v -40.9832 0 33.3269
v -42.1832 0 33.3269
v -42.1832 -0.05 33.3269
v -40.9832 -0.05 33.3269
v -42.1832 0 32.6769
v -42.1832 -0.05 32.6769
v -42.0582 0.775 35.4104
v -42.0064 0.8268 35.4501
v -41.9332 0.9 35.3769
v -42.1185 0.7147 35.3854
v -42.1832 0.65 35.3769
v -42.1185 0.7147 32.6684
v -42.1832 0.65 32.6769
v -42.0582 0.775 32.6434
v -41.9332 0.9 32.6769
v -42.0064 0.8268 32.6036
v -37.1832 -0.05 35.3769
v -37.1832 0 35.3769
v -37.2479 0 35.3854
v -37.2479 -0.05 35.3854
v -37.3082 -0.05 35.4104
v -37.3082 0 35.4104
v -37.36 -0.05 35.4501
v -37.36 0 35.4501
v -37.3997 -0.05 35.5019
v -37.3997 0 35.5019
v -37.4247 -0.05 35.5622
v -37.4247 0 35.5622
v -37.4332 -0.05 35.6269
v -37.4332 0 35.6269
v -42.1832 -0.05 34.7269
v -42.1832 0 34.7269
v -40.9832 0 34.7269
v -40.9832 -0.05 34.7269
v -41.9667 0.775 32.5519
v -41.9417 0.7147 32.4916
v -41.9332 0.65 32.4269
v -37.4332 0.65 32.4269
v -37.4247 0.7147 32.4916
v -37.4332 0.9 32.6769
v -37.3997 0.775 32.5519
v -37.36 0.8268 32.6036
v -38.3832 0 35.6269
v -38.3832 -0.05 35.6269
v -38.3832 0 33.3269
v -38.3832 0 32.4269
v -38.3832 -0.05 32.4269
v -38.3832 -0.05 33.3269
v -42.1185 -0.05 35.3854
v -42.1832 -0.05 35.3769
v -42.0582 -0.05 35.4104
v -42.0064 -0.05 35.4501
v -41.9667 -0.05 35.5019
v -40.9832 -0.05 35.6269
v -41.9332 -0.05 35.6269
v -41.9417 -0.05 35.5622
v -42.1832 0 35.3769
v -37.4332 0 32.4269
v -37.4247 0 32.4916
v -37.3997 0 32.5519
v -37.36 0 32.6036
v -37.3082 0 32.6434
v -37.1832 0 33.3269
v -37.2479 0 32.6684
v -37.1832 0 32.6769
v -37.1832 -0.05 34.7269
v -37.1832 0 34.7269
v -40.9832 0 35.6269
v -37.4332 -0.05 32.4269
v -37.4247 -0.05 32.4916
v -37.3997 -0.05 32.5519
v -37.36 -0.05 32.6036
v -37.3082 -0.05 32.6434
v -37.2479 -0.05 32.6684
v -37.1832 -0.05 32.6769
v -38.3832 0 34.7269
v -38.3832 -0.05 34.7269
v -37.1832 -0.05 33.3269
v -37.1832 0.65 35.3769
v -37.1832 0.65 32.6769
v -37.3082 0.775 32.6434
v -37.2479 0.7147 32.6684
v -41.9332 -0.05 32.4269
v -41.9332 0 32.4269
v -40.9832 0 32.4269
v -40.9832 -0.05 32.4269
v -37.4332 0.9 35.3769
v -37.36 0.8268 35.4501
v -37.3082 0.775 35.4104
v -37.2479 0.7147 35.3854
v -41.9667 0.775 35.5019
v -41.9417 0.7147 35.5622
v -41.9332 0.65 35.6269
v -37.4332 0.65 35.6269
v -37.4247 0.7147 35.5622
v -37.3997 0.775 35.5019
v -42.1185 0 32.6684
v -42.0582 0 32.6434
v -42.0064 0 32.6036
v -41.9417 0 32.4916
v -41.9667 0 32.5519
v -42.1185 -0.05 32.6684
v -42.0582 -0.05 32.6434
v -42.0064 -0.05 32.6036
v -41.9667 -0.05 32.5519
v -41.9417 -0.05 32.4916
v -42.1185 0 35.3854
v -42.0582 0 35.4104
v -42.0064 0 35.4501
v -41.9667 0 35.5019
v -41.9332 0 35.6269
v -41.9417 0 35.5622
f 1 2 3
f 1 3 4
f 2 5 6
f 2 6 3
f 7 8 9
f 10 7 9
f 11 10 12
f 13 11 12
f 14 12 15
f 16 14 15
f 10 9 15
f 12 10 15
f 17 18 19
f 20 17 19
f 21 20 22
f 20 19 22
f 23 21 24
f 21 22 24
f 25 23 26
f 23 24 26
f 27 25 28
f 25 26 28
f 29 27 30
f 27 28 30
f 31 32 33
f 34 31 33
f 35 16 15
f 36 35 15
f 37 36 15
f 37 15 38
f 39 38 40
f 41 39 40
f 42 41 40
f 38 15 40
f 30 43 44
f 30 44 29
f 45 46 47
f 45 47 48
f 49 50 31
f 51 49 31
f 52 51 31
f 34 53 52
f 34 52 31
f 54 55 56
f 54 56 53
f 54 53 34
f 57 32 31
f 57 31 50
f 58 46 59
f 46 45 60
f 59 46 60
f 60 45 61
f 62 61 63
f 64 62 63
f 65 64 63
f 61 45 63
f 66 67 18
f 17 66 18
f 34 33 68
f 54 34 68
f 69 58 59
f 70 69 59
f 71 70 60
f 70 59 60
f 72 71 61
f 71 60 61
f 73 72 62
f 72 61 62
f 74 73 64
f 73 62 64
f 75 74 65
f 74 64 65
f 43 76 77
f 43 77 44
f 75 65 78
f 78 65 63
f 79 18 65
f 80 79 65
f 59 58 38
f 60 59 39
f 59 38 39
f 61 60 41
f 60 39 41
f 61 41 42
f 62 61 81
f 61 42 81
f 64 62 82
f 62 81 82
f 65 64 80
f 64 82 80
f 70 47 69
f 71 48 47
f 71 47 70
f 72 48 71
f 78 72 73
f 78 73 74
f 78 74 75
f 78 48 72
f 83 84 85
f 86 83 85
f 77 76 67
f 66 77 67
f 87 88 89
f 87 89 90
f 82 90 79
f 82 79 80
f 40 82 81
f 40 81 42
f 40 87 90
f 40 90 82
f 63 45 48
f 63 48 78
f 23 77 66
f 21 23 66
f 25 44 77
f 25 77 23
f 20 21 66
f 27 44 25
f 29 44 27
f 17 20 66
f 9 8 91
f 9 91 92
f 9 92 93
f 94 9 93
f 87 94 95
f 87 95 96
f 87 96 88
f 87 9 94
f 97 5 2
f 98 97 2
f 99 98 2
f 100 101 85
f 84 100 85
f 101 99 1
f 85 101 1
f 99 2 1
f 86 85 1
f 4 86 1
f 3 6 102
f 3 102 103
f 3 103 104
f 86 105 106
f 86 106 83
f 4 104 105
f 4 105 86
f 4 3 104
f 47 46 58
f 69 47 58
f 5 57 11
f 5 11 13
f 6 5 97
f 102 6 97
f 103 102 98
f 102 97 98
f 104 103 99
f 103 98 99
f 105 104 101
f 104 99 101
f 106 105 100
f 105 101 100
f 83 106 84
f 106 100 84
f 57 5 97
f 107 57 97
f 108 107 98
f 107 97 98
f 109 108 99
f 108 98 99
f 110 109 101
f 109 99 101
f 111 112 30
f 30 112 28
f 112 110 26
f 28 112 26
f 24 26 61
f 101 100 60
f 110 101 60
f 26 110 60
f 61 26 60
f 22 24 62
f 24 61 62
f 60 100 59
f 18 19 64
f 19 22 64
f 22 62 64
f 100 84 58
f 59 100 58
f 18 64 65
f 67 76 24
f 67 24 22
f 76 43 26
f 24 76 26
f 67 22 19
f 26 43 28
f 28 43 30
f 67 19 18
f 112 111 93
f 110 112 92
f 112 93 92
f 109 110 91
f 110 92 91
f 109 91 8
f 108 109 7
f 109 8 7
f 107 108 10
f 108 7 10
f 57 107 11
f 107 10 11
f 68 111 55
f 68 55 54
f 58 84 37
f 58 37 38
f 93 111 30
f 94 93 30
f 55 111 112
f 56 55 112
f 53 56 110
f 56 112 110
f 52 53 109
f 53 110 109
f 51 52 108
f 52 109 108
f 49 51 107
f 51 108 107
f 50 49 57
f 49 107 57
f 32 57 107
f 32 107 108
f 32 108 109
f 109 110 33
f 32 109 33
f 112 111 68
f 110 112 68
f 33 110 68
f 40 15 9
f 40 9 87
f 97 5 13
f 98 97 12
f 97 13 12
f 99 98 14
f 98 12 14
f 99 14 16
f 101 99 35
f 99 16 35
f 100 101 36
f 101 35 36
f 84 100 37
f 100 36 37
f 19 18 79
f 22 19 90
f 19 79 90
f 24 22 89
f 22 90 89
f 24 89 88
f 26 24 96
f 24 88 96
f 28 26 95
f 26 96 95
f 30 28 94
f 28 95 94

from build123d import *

# Parameters (mm, degrees)
SKETCH1_W        = 5
SKETCH1_H        = 3.2
EXTRUDE1_DEPTH   = 0.9
CHAMFER1_SIZE    = 0.25
SKETCH2_W        = 1.2
SKETCH2_H        = 0.9
EXTRUDE2_DEPTH   = 0.05
EXTRUDE2_2_DEPTH = 0.05
EXTRUDE2_3_DEPTH = 0.05
EXTRUDE2_4_DEPTH = 0.05
SKETCH3_R        = 0.25
EXTRUDE3_DEPTH   = 56.223174198


with BuildPart() as part:
    # Sketch1 → Extrude1 (new body)
    with BuildSketch(Plane(origin=(0, 0, 0), x_dir=(1, 0, 0), z_dir=(0, 1, 0))):
        with Locations((-39.683203209, -34.026869572)):
            Rectangle(SKETCH1_W, SKETCH1_H)
    extrude(amount=EXTRUDE1_DEPTH)

    # Chamfer1
    chamfer1_edges = [part.edges().sort_by_distance(p)[0] for p in [
        (-37.183203209, 0.9, 34.026869572),
        (-39.683203209, 0.9, 32.426869572),
        (-42.183203209, 0.9, 34.026869572),
        (-39.683203209, 0.9, 35.626869572),
    ]]
    chamfer(chamfer1_edges, length=CHAMFER1_SIZE)


with BuildPart() as body_2:
    # Sketch2 → Extrude2 (new body)
    with BuildSketch(Plane.XZ):
        with Locations((-41.583203209, 35.176869572)):
            Rectangle(SKETCH2_W, SKETCH2_H)
    extrude(amount=EXTRUDE2_DEPTH)


with BuildPart() as body_3:
    # Sketch2 → Extrude2 2 (new body)
    with BuildSketch(Plane.XZ):
        with Locations((-37.783203209, 35.176869572)):
            Rectangle(SKETCH2_W, SKETCH2_H)
    extrude(amount=EXTRUDE2_2_DEPTH)


with BuildPart() as body_4:
    # Sketch2 → Extrude2 3 (new body)
    with BuildSketch(Plane.XZ):
        with Locations((-37.783203209, 32.876869572)):
            Rectangle(SKETCH2_W, SKETCH2_H)
    extrude(amount=EXTRUDE2_3_DEPTH)


with BuildPart() as body_5:
    # Sketch2 → Extrude2 4 (new body)
    with BuildSketch(Plane.XZ):
        with Locations((-41.583203209, 32.876869572)):
            Rectangle(SKETCH2_W, SKETCH2_H)
    extrude(amount=EXTRUDE2_4_DEPTH)


with BuildPart() as extrude3_tool:
    # Sketch3 → Extrude3 (new, through all)
    with BuildSketch(Plane(origin=(0, 0.9, 0), x_dir=(1, 0, 0), z_dir=(0, 1, 0))):
        with Locations((-42.183203209, -32.426869572)):
            Circle(SKETCH3_R)
        with Locations((-37.183203209, -32.426869572)):
            Circle(SKETCH3_R)
        with Locations((-37.183203209, -35.626869572)):
            Circle(SKETCH3_R)
        with Locations((-42.183203209, -35.626869572)):
            Circle(SKETCH3_R)
    extrude(amount=-EXTRUDE3_DEPTH)


with BuildPart() as part_1:
    add(part.part)

    # Extrude3: cut by extrude3_tool
    add(extrude3_tool.part, mode=Mode.SUBTRACT)


with BuildPart() as body_2_1:
    add(body_2.part)

    # Extrude3: cut by extrude3_tool
    add(extrude3_tool.part, mode=Mode.SUBTRACT)


with BuildPart() as body_3_1:
    add(body_3.part)

    # Extrude3: cut by extrude3_tool
    add(extrude3_tool.part, mode=Mode.SUBTRACT)


with BuildPart() as body_4_1:
    add(body_4.part)

    # Extrude3: cut by extrude3_tool
    add(extrude3_tool.part, mode=Mode.SUBTRACT)


with BuildPart() as body_5_1:
    add(body_5.part)

    # Extrude3: cut by extrude3_tool
    add(extrude3_tool.part, mode=Mode.SUBTRACT)


solid = Compound([part_1.part, body_2_1.part, body_3_1.part, body_4_1.part, body_5_1.part])
